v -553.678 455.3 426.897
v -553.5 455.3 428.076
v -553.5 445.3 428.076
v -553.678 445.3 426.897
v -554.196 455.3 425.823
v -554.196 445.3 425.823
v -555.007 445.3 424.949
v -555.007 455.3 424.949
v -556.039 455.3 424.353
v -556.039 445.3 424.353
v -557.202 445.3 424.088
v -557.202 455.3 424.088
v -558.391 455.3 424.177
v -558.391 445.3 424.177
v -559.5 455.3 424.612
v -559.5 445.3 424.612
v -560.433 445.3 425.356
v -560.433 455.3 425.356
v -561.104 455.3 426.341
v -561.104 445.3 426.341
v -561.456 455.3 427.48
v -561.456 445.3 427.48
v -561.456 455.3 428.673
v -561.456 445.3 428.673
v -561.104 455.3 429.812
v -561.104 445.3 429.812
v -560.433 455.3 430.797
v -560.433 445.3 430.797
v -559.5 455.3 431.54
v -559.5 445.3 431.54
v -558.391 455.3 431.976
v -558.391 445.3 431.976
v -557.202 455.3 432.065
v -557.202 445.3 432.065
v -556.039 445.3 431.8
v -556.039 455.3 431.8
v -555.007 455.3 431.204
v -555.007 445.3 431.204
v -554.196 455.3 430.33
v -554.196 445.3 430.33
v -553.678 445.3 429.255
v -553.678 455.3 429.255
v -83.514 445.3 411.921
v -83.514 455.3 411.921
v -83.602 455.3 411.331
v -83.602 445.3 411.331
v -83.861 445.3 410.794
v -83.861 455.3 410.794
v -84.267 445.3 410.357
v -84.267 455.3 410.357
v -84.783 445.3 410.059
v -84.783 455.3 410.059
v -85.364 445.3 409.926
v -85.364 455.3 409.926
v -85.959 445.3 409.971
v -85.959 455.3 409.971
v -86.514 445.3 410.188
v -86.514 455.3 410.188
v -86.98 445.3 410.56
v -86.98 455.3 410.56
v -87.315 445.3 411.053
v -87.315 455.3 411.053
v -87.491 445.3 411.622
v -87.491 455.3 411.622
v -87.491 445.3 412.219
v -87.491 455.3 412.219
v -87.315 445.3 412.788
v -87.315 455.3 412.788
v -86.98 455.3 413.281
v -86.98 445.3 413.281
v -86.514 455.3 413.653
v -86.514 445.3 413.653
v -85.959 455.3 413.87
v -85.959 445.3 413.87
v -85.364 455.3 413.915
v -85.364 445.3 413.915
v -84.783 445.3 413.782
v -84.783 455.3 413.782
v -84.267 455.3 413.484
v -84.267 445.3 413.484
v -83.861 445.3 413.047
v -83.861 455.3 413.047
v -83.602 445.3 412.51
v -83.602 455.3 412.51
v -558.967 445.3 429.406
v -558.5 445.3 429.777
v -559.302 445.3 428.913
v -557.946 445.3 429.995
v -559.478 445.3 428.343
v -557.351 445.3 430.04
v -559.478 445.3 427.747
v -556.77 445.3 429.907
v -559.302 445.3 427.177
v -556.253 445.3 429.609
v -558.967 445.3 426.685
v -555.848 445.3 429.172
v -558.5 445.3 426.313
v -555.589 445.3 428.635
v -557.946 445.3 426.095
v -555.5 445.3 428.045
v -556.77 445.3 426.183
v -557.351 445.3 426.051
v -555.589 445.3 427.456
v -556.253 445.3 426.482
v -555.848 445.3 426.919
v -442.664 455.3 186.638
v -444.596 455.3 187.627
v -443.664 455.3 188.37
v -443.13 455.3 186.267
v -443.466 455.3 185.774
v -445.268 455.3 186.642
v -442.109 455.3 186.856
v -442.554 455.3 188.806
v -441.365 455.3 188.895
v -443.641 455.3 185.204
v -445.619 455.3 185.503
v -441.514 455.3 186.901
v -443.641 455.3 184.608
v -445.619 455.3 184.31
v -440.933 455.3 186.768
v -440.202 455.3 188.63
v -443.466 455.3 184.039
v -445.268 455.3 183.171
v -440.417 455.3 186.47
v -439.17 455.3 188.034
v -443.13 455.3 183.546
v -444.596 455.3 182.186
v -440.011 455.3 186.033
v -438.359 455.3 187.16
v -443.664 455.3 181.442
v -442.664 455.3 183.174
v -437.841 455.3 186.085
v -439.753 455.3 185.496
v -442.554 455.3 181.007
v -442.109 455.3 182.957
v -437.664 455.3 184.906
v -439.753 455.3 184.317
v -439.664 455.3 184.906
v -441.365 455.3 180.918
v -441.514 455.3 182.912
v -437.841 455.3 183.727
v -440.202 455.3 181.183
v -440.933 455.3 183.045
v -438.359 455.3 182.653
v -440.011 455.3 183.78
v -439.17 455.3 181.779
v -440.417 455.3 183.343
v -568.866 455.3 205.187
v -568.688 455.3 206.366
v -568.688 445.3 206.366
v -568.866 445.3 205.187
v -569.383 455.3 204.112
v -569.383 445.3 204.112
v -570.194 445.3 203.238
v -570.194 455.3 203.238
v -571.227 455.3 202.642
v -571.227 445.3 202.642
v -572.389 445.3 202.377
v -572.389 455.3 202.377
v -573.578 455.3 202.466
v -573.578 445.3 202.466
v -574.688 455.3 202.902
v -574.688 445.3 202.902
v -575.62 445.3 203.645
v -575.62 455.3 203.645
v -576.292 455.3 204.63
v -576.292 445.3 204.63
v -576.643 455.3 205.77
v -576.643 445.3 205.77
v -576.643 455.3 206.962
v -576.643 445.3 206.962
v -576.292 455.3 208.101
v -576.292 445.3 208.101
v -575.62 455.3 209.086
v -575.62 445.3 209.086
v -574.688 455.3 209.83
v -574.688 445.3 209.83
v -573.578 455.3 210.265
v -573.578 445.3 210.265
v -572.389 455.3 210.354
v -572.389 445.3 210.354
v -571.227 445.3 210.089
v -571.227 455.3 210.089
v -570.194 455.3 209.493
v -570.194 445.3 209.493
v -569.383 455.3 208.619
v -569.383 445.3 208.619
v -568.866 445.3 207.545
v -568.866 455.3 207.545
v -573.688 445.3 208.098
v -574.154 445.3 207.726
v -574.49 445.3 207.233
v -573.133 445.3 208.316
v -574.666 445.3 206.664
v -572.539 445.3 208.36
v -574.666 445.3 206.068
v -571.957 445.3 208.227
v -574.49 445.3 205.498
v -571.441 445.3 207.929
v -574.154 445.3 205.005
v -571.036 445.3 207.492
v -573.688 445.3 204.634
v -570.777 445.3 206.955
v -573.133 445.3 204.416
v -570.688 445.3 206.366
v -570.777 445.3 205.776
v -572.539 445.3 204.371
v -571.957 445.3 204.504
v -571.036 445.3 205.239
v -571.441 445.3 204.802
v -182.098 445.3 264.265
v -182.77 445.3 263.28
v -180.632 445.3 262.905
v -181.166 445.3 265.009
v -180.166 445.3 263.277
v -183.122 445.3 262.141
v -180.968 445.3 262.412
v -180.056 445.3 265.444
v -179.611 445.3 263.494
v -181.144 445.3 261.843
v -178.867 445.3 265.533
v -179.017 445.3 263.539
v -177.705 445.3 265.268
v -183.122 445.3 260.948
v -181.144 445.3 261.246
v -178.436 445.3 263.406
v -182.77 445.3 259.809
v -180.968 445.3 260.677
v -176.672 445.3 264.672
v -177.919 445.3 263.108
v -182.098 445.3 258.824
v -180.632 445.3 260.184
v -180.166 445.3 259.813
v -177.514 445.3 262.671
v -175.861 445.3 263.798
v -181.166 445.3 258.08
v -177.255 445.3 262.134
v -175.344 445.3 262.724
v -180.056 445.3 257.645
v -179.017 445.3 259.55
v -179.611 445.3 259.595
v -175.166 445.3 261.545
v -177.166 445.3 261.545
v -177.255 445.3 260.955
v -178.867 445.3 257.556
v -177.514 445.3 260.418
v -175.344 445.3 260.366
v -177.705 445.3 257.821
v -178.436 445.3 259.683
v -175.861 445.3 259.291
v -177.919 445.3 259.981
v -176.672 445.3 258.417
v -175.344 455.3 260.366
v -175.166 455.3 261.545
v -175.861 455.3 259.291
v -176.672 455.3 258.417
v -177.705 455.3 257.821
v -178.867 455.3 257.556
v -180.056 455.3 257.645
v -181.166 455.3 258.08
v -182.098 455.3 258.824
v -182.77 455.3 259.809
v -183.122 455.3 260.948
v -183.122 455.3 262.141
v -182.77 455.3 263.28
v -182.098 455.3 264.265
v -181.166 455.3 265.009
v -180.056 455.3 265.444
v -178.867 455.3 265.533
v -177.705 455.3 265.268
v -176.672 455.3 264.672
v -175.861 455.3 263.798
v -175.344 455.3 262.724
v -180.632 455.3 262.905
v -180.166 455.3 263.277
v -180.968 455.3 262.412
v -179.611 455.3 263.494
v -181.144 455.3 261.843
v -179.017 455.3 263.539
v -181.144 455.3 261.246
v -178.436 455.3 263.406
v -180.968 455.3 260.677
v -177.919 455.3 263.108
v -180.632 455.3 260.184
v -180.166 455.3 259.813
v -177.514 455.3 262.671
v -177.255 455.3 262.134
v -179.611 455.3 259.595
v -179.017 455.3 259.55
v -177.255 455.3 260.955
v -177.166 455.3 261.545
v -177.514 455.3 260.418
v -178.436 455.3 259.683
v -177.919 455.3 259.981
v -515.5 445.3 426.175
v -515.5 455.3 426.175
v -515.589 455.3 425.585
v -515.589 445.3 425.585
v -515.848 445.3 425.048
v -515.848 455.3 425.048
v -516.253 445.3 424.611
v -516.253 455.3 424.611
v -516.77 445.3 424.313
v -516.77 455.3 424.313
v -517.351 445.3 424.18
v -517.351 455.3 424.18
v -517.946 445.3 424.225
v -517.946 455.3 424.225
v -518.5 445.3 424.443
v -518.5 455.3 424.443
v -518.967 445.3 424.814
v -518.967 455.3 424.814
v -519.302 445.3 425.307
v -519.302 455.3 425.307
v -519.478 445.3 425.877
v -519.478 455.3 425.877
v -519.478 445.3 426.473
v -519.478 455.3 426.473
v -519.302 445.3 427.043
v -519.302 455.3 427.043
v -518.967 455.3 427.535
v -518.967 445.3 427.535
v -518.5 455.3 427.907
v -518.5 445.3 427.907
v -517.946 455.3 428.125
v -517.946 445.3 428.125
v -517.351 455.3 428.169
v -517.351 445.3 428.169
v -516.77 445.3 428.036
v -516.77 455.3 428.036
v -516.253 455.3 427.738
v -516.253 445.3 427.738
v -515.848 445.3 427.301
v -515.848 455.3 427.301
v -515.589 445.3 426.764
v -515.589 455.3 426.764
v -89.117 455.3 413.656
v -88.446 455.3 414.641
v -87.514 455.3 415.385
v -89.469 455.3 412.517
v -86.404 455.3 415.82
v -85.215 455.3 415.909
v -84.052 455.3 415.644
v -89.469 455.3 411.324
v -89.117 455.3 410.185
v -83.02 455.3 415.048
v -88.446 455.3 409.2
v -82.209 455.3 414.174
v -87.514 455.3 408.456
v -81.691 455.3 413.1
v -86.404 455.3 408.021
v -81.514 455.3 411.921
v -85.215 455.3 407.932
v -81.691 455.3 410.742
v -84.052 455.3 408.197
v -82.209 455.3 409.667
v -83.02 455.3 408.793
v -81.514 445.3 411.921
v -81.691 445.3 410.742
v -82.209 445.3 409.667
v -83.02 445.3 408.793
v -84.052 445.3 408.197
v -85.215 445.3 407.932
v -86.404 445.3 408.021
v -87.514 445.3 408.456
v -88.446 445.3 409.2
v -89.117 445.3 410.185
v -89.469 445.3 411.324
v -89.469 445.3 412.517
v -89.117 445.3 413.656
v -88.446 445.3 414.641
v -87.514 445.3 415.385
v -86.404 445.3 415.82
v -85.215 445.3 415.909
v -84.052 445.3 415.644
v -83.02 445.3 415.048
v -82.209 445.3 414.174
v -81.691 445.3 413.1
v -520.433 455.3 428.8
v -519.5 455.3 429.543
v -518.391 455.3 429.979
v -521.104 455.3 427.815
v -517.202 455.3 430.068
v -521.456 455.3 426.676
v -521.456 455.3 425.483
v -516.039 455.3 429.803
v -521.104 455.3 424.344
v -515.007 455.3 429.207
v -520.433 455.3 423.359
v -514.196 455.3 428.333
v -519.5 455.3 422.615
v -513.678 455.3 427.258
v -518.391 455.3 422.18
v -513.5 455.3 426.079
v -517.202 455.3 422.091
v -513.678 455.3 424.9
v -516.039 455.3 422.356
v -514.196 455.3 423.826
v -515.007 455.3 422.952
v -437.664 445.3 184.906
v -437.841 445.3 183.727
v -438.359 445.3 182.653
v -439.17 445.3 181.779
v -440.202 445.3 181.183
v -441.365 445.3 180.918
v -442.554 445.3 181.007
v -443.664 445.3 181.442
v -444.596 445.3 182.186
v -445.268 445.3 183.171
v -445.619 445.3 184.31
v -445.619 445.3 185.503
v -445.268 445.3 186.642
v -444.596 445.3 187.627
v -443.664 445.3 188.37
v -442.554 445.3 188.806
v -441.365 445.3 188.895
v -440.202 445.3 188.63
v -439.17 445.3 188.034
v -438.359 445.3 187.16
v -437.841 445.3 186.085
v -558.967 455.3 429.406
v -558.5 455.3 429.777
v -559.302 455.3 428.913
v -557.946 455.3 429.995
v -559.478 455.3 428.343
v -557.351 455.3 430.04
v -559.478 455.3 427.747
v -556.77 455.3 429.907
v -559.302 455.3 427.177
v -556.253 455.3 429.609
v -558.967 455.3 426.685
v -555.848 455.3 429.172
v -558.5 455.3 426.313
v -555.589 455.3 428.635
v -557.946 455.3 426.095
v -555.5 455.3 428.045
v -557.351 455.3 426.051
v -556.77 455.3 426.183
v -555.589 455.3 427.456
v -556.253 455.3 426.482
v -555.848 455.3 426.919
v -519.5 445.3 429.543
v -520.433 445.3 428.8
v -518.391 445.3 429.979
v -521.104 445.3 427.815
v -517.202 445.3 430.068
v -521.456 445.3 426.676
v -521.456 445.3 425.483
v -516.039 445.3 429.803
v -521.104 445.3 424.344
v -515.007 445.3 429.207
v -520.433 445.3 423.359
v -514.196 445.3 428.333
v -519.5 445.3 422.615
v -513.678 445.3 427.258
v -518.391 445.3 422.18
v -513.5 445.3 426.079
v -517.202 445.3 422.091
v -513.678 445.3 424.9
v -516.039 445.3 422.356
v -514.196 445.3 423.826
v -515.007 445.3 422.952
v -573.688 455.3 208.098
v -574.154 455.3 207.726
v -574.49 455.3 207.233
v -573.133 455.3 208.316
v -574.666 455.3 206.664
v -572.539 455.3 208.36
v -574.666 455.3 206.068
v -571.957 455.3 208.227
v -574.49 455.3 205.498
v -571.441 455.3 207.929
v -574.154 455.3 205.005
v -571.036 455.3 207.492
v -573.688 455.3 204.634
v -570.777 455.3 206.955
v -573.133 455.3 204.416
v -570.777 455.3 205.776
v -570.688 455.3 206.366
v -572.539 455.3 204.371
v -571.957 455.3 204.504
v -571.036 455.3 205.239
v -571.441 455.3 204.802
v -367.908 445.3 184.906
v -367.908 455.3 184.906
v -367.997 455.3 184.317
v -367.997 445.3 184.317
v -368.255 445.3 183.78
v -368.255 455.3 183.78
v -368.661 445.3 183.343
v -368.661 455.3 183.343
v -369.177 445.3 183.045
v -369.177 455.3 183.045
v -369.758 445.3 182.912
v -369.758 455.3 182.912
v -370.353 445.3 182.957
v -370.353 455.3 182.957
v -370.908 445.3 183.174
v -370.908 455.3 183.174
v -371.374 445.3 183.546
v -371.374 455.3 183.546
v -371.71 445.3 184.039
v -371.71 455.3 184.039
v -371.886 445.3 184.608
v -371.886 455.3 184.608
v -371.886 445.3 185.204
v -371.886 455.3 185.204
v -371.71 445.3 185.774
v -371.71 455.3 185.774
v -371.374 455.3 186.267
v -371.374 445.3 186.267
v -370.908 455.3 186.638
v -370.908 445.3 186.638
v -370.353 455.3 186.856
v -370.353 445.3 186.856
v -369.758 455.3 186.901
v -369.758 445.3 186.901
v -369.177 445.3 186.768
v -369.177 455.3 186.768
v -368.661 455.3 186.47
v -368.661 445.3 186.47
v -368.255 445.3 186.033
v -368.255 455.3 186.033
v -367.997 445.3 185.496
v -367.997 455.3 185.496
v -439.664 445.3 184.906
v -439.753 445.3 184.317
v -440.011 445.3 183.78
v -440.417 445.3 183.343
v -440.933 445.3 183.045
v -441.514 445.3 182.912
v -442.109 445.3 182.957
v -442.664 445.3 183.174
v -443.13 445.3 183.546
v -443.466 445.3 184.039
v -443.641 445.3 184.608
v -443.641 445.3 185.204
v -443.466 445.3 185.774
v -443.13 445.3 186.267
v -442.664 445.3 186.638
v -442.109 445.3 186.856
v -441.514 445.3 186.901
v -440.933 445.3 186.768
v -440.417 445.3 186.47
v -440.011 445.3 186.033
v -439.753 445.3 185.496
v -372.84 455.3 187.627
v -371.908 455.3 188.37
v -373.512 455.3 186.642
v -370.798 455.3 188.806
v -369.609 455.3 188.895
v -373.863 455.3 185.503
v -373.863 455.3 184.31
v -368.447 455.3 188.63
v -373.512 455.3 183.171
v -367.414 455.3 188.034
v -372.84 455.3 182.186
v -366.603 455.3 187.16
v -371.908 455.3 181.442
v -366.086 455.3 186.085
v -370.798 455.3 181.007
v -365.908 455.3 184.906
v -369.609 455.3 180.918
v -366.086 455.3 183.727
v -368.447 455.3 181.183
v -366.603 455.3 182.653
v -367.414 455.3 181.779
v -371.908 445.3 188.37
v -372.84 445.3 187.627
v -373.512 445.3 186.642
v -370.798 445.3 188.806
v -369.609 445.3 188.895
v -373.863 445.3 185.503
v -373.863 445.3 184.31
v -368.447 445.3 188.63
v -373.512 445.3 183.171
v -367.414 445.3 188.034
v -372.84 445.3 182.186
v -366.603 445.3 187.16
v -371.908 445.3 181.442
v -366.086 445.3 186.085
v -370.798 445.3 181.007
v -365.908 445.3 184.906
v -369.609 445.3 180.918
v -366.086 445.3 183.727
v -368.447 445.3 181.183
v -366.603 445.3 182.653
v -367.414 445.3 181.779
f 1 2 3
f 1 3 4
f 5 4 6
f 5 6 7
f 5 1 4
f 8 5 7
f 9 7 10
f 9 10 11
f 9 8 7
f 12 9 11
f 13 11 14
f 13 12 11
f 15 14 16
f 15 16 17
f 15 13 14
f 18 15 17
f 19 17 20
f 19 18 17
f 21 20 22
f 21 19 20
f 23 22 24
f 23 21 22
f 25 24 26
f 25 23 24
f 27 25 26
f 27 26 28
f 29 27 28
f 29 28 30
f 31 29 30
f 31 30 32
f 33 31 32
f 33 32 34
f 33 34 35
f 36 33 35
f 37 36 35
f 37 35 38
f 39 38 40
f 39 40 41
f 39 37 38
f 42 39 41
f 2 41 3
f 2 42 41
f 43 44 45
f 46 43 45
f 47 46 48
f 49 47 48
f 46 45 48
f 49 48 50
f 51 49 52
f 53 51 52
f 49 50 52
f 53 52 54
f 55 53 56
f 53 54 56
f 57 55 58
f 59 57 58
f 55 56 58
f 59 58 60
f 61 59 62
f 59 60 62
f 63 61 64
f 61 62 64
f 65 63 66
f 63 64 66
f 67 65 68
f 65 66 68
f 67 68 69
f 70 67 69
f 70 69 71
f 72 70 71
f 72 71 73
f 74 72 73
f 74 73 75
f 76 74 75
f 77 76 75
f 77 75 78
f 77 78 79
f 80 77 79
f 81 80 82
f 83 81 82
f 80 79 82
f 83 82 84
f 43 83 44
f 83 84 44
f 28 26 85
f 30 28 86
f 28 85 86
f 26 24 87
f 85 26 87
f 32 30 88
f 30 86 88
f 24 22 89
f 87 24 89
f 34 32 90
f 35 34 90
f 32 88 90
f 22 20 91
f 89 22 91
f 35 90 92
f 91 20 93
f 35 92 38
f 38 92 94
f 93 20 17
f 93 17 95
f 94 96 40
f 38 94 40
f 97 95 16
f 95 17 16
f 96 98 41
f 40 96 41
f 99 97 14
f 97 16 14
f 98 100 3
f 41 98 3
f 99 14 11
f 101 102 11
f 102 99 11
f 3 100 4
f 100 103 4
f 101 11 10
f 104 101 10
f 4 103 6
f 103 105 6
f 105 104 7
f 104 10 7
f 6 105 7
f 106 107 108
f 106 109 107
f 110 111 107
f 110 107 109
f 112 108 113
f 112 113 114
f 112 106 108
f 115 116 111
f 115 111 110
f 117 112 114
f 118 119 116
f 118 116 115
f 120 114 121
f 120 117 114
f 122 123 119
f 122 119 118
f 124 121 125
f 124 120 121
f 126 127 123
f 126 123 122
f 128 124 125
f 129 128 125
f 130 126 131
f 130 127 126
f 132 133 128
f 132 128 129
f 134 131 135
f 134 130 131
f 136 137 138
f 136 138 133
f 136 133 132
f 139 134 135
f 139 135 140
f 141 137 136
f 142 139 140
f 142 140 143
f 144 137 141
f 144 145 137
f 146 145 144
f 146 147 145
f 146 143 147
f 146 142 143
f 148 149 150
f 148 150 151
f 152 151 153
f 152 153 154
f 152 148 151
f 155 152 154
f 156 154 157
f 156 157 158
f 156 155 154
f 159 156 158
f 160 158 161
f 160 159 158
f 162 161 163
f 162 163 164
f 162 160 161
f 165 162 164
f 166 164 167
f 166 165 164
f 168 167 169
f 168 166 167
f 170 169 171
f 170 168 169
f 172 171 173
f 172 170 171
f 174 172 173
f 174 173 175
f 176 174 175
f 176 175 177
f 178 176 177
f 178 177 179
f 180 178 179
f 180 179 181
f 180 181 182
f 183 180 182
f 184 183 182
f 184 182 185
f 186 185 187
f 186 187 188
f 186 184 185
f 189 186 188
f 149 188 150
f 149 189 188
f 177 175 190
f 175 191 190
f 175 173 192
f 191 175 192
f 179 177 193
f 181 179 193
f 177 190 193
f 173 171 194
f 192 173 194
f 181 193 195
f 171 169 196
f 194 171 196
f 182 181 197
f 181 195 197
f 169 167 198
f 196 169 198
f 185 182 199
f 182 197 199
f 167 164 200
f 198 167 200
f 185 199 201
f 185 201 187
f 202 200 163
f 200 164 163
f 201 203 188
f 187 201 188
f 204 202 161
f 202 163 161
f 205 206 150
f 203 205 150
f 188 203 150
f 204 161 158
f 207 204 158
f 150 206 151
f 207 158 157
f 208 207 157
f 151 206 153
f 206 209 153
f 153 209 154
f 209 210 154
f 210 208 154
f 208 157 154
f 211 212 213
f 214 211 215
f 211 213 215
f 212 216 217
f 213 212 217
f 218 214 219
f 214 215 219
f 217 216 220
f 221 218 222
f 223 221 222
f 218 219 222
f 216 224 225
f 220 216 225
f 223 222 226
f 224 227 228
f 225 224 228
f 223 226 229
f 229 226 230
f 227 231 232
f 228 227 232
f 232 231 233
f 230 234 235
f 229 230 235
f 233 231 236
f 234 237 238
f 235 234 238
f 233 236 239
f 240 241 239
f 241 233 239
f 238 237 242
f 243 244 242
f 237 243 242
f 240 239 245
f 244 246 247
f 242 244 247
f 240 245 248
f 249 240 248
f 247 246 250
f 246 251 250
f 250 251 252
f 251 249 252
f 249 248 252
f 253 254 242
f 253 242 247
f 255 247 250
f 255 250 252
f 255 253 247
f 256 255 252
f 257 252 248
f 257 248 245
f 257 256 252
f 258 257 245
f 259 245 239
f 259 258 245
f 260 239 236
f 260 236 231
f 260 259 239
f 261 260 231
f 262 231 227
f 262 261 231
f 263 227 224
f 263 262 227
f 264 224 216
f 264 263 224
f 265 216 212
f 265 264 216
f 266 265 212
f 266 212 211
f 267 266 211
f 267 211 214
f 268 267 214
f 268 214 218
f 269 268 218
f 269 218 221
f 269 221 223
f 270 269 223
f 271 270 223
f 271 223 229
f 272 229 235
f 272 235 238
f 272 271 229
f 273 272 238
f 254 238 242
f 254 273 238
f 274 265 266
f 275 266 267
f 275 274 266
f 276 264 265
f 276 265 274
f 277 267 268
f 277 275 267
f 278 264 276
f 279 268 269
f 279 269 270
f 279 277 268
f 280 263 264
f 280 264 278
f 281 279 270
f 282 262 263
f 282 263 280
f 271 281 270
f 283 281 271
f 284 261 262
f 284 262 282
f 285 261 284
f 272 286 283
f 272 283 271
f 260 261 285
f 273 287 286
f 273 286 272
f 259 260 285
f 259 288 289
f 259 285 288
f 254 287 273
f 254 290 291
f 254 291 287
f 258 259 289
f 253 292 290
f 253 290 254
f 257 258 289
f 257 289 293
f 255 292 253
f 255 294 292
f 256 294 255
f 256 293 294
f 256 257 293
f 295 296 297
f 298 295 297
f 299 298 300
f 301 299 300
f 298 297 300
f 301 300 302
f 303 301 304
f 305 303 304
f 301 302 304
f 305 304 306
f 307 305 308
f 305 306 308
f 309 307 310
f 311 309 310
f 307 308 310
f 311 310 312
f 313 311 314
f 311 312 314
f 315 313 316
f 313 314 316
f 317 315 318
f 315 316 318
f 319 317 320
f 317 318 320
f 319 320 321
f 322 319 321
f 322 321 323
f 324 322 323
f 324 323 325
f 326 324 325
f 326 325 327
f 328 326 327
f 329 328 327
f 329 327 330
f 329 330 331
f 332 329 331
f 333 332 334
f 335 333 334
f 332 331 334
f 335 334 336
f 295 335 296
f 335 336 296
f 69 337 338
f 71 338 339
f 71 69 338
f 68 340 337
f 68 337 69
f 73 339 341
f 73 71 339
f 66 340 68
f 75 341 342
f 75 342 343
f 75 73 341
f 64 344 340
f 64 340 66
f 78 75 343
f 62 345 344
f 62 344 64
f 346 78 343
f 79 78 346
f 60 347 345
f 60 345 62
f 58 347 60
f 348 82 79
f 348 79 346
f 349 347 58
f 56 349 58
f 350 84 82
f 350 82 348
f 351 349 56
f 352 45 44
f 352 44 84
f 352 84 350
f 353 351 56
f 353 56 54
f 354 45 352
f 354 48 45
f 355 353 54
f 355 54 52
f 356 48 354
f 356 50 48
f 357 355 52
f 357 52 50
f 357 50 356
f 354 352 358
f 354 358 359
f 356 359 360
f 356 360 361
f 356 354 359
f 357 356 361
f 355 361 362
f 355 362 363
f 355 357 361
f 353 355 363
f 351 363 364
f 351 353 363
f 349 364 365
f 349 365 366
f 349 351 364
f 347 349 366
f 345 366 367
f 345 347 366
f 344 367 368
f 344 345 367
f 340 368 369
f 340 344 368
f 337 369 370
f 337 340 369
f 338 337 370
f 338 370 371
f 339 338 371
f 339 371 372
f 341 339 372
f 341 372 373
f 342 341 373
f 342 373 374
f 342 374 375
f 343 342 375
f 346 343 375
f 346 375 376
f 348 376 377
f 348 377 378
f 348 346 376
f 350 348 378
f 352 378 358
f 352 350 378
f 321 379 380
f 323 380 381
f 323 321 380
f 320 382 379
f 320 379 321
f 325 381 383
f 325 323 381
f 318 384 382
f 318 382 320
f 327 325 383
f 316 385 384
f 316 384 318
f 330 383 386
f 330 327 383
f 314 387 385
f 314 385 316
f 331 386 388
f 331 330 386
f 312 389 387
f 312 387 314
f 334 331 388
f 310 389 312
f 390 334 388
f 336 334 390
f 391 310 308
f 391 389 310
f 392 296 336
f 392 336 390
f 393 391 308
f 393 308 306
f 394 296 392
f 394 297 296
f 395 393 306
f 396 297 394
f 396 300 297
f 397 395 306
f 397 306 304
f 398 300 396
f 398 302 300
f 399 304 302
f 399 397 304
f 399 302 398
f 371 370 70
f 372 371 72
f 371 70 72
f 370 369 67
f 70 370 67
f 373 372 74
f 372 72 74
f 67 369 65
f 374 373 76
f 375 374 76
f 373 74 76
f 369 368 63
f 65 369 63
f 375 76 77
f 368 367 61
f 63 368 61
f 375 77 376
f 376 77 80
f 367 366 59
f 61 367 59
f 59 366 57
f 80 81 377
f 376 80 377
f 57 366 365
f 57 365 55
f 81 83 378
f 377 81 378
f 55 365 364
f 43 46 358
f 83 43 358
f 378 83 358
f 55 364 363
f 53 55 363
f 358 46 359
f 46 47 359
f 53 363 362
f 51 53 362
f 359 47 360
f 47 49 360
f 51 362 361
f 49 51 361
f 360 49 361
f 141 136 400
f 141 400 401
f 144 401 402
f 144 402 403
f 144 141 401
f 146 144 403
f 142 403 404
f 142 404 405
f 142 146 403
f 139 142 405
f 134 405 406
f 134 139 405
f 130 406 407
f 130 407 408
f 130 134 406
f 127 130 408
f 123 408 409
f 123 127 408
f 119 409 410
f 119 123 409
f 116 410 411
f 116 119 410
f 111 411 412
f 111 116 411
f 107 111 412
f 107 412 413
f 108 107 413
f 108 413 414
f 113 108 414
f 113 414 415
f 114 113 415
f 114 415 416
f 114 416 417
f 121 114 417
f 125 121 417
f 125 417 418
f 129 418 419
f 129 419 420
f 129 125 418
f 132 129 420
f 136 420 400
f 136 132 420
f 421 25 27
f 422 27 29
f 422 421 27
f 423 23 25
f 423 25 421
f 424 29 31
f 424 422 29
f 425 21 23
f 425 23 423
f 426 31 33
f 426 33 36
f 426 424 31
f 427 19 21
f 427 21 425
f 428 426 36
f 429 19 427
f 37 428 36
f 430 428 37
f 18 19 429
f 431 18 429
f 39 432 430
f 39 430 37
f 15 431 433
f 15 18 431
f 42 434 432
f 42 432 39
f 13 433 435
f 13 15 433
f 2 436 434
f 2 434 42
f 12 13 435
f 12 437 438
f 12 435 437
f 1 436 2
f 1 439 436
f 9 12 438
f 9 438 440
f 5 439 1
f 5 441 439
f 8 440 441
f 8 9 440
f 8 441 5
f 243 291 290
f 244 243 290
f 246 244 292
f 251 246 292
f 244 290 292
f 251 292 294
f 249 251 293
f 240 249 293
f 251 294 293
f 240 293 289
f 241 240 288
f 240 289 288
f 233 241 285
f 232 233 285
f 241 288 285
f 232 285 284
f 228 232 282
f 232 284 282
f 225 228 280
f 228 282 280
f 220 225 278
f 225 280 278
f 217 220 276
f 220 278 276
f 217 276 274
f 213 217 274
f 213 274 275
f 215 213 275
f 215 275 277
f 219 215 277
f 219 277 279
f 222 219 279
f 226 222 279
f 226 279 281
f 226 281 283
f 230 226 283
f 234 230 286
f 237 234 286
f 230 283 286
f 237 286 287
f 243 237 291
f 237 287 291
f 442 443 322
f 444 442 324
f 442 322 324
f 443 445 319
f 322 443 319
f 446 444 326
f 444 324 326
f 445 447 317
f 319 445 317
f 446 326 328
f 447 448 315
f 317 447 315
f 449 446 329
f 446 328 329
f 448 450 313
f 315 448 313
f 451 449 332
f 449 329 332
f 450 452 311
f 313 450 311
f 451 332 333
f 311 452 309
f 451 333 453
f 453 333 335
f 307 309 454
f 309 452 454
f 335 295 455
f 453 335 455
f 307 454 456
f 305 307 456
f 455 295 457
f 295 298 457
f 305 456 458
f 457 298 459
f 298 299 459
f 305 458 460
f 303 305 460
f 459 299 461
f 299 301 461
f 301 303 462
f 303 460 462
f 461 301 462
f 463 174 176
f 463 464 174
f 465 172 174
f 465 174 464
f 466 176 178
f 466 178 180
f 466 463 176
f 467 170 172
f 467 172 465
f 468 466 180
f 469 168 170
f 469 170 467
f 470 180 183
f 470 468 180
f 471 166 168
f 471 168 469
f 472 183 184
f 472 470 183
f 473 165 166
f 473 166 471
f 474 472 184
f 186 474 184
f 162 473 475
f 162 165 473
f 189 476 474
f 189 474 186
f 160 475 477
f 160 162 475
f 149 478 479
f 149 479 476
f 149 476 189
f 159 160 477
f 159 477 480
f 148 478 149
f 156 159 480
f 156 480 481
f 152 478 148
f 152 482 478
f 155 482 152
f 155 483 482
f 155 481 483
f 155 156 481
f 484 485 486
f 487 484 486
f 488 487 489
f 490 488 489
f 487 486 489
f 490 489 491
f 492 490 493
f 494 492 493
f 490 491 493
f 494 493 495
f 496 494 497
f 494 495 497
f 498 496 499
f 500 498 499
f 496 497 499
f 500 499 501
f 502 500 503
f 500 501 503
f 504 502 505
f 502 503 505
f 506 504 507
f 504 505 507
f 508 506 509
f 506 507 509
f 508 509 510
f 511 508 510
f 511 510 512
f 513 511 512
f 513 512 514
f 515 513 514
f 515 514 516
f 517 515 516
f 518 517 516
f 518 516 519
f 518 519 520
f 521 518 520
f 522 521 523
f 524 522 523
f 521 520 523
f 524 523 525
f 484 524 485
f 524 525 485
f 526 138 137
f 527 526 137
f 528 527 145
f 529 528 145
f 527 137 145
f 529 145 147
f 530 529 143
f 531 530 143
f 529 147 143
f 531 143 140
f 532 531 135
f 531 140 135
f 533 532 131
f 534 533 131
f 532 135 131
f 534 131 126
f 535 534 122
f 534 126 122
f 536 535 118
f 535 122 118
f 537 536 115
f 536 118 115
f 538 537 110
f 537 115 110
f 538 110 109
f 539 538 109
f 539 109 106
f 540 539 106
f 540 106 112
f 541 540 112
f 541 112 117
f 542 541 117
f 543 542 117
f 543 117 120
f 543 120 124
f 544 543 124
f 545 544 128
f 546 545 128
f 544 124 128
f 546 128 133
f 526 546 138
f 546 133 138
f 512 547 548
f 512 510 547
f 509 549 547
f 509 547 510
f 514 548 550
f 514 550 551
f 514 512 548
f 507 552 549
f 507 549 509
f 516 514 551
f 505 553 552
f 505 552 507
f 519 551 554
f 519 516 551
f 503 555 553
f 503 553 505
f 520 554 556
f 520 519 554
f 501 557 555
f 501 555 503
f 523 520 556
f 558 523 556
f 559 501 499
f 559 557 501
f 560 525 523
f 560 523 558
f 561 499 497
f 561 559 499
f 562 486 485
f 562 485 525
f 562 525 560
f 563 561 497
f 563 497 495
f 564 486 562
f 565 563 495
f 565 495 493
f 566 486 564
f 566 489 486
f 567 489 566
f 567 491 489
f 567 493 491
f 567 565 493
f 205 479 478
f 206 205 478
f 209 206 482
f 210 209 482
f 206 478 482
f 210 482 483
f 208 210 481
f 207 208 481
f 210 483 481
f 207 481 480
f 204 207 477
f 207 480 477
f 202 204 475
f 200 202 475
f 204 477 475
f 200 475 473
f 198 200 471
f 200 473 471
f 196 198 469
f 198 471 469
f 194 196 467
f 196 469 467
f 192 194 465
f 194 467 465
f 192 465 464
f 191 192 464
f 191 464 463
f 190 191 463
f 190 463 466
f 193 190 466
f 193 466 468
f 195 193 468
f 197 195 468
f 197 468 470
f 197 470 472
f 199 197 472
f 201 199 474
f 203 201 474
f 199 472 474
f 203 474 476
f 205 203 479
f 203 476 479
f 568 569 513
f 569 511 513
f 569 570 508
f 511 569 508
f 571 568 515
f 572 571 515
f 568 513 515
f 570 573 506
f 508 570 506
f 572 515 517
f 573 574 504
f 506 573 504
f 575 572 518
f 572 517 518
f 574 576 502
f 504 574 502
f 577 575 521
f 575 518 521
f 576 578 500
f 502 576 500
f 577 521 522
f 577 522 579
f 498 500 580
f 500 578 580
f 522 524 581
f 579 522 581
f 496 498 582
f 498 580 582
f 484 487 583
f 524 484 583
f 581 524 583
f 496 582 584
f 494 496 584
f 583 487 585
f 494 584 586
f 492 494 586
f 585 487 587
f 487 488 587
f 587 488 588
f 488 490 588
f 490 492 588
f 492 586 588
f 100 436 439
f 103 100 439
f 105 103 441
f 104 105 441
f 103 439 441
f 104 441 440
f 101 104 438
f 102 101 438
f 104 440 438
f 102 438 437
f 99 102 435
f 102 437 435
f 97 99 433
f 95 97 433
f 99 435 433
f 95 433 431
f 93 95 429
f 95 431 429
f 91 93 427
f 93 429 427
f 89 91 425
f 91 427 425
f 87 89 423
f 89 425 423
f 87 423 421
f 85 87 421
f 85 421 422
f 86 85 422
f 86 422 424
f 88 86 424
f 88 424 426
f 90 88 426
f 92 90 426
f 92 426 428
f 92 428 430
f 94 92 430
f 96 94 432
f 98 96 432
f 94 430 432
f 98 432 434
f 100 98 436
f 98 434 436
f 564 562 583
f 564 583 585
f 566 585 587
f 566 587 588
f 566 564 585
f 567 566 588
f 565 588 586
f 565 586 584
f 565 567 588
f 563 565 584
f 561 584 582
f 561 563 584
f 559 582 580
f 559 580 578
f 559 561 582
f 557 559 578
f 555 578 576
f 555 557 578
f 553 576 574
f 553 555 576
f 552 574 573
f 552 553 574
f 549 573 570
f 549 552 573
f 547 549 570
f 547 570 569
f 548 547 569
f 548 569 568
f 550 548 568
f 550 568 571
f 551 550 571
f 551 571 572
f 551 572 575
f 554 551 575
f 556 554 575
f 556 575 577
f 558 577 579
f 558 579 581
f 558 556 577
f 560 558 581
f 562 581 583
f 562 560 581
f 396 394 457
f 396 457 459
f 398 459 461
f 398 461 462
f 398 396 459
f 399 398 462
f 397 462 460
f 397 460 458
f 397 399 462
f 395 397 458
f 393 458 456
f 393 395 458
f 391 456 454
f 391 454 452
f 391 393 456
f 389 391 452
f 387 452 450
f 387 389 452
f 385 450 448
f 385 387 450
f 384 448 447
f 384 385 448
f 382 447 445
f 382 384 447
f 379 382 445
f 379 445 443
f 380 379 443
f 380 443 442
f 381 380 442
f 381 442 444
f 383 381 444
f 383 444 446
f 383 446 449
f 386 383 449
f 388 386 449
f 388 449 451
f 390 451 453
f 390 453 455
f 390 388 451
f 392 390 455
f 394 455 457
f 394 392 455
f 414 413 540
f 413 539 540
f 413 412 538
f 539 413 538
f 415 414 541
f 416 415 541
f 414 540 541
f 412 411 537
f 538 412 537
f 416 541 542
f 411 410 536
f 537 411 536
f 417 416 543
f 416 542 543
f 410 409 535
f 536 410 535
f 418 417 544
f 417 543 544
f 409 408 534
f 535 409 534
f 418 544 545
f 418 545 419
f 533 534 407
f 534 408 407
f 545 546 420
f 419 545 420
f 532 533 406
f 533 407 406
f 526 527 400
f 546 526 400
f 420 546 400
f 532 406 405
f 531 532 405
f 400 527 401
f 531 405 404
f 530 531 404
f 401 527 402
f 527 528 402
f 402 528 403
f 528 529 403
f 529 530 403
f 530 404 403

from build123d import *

# Parameters (mm, degrees)
SZKIC1_R                      = 4
SZKIC1_R_2                    = 2
DODANIE_WYCI_GNI_CIE1_DEPTH   = 10
DODANIE_WYCI_GNI_CIE1_2_DEPTH = 10
DODANIE_WYCI_GNI_CIE1_3_DEPTH = 10
SZKIC1_R_3                    = 3.999999999
DODANIE_WYCI_GNI_CIE1_4_DEPTH = 10
DODANIE_WYCI_GNI_CIE1_5_DEPTH = 10
DODANIE_WYCI_GNI_CIE1_6_DEPTH = 10
DODANIE_WYCI_GNI_CIE1_7_DEPTH = 10


with BuildPart() as part:
    # Szkic1 → Dodanie-wyciągnięcie1 (new body)
    with BuildSketch(Plane(origin=(0, 455.3, 0), x_dir=(1, 0, 0), z_dir=(0, 1, 0))):
        with Locations((-557.500474948, -428.076388532)):
            Circle(SZKIC1_R)
        with Locations((-557.500474948, -428.045174827)):
            Circle(SZKIC1_R_2, mode=Mode.SUBTRACT)
    extrude(amount=-DODANIE_WYCI_GNI_CIE1_DEPTH)


with BuildPart() as body_2:
    # Szkic1 → Dodanie-wyci_gni_cie1 2 (new body)
    with BuildSketch(Plane(origin=(0, 455.3, 0), x_dir=(1, 0, 0), z_dir=(0, 1, 0))):
        with Locations((-517.500474948, -426.079389265)):
            Circle(SZKIC1_R)
        with Locations((-517.500474948, -426.174740182)):
            Circle(SZKIC1_R_2, mode=Mode.SUBTRACT)
    extrude(amount=-DODANIE_WYCI_GNI_CIE1_2_DEPTH)


with BuildPart() as body_3:
    # Szkic1 → Dodanie-wyci_gni_cie1 3 (new body)
    with BuildSketch(Plane(origin=(0, 455.3, 0), x_dir=(1, 0, 0), z_dir=(0, 1, 0))):
        with Locations((-85.513533731, -411.920534849)):
            Circle(SZKIC1_R)
        with Locations((-85.513533731, -411.920534849)):
            Circle(SZKIC1_R_2, mode=Mode.SUBTRACT)
    extrude(amount=-DODANIE_WYCI_GNI_CIE1_3_DEPTH)


with BuildPart() as body_4:
    # Szkic1 → Dodanie-wyci_gni_cie1 4 (new body)
    with BuildSketch(Plane(origin=(0, 455.3, 0), x_dir=(1, 0, 0), z_dir=(0, 1, 0))):
        with Locations((-179.166238959, -261.544556892)):
            Circle(SZKIC1_R_3)
        with Locations((-179.166238959, -261.544556892)):
            Circle(SZKIC1_R_2, mode=Mode.SUBTRACT)
    extrude(amount=-DODANIE_WYCI_GNI_CIE1_4_DEPTH)


with BuildPart() as body_5:
    # Szkic1 → Dodanie-wyci_gni_cie1 5 (new body)
    with BuildSketch(Plane(origin=(0, 455.3, 0), x_dir=(1, 0, 0), z_dir=(0, 1, 0))):
        with Locations((-369.907883248, -184.906368669)):
            Circle(SZKIC1_R)
        with Locations((-369.907883248, -184.906368669)):
            Circle(SZKIC1_R_2, mode=Mode.SUBTRACT)
    extrude(amount=-DODANIE_WYCI_GNI_CIE1_5_DEPTH)


with BuildPart() as body_6:
    # Szkic1 → Dodanie-wyci_gni_cie1 6 (new body)
    with BuildSketch(Plane(origin=(0, 455.3, 0), x_dir=(1, 0, 0), z_dir=(0, 1, 0))):
        with Locations((-441.66371711, -184.906368669)):
            Circle(SZKIC1_R)
        with Locations((-441.66371711, -184.906368669)):
            Circle(SZKIC1_R_2, mode=Mode.SUBTRACT)
    extrude(amount=-DODANIE_WYCI_GNI_CIE1_6_DEPTH)


with BuildPart() as body_7:
    # Szkic1 → Dodanie-wyci_gni_cie1 7 (new body)
    with BuildSketch(Plane(origin=(0, 455.3, 0), x_dir=(1, 0, 0), z_dir=(0, 1, 0))):
        with Locations((-572.687982615, -206.365683114)):
            Circle(SZKIC1_R)
        with Locations((-572.687982615, -206.365683114)):
            Circle(SZKIC1_R_2, mode=Mode.SUBTRACT)
    extrude(amount=-DODANIE_WYCI_GNI_CIE1_7_DEPTH)


solid = Compound([part.part, body_2.part, body_3.part, body_4.part, body_5.part, body_6.part, body_7.part])
